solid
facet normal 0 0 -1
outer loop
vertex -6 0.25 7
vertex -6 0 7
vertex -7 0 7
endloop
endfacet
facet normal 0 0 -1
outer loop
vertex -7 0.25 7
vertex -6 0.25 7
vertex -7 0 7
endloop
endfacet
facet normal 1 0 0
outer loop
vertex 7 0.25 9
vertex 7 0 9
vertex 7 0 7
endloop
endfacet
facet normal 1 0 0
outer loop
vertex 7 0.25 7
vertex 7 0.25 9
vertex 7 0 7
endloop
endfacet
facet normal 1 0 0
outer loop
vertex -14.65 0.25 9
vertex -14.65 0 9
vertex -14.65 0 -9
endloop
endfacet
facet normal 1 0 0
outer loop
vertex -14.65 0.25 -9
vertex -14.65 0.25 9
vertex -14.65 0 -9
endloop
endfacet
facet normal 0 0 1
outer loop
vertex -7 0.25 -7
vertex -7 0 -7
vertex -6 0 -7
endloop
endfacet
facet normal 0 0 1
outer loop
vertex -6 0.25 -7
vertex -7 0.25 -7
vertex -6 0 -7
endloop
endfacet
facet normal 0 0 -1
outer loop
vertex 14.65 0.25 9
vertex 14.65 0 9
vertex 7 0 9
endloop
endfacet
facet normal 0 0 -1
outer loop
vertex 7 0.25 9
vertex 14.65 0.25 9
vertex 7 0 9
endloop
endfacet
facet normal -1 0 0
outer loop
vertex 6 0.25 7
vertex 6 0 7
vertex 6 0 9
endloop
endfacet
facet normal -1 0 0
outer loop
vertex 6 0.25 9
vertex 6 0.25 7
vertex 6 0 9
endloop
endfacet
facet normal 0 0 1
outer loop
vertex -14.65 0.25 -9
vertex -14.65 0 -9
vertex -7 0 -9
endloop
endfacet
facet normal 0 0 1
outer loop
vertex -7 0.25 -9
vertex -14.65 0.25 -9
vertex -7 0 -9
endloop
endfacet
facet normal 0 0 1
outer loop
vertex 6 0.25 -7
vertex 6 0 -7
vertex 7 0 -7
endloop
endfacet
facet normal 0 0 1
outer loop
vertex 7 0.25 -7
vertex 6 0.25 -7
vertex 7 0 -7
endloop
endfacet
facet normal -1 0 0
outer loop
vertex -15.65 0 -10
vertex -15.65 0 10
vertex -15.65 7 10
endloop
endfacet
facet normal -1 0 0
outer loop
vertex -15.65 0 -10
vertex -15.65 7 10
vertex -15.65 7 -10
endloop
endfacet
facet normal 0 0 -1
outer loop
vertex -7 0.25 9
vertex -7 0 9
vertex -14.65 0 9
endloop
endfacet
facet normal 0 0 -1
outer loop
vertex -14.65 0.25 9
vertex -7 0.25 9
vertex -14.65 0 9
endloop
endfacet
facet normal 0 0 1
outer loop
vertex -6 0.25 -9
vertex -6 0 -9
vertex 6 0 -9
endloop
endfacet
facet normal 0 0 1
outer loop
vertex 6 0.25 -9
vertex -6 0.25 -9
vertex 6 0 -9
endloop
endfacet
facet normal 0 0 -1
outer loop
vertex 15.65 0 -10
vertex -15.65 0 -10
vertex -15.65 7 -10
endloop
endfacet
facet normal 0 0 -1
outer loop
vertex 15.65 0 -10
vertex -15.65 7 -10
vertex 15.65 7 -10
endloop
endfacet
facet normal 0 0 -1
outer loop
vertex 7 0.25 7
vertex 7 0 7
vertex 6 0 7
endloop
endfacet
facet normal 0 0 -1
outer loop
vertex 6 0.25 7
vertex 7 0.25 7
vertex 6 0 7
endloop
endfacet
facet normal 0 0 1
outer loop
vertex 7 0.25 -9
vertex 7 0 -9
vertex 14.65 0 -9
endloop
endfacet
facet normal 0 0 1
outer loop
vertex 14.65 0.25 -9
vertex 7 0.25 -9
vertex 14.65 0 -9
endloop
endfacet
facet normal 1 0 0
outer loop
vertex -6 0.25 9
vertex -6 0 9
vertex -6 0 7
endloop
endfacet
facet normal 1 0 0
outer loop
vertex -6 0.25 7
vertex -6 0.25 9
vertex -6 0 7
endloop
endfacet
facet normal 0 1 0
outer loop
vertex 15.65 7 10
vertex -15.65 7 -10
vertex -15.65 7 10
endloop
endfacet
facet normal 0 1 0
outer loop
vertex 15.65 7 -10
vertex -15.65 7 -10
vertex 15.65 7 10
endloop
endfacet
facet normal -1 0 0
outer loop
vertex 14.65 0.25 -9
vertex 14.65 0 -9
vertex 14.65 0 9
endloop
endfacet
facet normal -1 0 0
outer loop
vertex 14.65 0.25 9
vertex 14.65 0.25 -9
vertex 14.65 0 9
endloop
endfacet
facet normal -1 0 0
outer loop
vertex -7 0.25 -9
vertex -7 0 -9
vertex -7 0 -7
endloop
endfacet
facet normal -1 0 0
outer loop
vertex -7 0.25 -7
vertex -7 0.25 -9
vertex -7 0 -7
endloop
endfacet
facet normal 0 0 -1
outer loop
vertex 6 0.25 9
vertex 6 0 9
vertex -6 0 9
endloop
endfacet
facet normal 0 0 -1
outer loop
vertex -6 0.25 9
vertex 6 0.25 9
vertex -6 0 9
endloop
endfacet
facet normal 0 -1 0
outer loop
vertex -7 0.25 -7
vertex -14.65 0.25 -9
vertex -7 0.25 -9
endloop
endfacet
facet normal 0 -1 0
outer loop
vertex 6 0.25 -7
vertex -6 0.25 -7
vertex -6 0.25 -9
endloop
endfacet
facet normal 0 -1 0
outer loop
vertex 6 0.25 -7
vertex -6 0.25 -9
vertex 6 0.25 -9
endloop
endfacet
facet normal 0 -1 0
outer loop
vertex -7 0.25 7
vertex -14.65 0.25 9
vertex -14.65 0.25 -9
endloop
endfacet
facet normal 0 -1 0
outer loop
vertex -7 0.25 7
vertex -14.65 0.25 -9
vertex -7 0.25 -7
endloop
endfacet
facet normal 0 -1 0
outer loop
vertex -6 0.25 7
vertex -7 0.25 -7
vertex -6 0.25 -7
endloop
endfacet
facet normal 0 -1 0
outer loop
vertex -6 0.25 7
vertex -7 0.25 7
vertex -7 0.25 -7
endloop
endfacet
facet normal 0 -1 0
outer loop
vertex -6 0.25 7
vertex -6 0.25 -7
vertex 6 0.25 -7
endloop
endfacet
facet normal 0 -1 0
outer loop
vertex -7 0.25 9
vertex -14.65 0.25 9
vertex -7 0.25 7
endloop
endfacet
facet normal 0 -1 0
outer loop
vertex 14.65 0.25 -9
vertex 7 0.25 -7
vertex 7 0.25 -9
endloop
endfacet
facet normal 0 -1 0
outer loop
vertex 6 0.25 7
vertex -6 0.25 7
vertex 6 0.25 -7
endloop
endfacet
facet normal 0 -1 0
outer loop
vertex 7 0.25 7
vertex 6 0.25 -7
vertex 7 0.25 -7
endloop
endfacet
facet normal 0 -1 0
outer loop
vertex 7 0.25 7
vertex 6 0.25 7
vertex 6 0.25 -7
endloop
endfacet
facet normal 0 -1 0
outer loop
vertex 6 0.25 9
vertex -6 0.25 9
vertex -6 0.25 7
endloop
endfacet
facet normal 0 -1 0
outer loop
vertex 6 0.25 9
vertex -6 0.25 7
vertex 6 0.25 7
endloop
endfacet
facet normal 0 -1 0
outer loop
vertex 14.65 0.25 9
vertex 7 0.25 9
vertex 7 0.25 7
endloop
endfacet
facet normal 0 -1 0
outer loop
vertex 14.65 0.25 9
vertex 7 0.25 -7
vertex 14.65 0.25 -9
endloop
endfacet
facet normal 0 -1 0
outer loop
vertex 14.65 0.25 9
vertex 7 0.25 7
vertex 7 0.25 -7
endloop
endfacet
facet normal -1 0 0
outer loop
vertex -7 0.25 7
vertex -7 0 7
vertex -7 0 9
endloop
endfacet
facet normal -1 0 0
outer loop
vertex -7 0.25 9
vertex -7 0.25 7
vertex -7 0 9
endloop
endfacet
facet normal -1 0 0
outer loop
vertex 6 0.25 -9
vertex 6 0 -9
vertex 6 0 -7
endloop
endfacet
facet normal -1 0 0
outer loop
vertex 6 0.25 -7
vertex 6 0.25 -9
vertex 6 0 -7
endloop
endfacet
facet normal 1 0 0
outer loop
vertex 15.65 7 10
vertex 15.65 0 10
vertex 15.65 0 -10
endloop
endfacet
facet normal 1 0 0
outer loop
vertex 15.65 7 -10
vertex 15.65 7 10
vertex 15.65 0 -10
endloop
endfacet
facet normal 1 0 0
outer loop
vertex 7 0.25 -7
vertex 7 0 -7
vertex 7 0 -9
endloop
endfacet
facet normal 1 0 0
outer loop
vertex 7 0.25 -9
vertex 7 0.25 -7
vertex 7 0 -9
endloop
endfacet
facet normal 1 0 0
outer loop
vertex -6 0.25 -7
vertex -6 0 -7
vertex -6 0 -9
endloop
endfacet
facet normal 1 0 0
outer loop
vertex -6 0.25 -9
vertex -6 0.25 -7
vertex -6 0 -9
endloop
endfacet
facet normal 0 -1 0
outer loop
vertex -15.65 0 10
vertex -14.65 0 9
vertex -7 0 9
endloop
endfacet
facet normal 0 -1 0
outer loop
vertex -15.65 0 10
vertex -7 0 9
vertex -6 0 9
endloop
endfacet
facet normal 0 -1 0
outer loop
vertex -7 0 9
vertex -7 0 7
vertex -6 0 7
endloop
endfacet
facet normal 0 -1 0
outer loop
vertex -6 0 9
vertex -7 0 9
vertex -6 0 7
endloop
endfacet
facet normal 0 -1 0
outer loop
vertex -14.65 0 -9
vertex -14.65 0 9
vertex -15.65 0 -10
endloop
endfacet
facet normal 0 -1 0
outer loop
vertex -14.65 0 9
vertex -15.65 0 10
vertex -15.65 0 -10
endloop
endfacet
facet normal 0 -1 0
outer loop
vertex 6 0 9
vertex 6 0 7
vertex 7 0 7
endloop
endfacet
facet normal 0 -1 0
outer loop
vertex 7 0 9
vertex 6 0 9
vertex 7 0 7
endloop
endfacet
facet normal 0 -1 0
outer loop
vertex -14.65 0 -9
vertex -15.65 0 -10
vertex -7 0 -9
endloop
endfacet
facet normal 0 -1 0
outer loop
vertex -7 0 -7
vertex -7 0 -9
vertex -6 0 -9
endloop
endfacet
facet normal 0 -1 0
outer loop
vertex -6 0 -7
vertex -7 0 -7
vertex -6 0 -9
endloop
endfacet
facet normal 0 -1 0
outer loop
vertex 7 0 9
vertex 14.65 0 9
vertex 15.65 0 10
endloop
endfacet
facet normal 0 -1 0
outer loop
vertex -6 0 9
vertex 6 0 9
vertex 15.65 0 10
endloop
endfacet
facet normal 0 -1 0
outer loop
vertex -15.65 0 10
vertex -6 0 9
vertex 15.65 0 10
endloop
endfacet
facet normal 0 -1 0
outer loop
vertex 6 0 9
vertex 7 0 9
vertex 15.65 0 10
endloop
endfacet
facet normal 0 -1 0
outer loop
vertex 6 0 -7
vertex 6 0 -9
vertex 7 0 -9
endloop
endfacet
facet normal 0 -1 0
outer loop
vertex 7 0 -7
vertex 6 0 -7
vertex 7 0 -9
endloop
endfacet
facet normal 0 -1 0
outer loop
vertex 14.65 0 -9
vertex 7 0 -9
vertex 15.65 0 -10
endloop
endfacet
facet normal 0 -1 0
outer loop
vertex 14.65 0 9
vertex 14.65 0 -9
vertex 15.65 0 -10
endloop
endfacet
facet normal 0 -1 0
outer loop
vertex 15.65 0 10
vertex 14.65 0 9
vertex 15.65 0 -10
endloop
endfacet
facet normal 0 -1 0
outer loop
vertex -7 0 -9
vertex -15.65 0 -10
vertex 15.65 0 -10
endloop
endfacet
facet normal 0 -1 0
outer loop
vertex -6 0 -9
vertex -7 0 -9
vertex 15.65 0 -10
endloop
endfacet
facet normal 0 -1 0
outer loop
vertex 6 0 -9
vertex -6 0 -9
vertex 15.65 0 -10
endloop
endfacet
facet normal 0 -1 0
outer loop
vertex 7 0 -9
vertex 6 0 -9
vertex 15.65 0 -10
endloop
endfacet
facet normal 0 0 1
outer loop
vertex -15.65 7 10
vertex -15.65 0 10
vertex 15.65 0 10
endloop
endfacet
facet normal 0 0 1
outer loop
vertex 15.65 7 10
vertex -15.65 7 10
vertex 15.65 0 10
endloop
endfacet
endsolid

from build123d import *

# Parameters (mm, degrees)
SKETCH1_W           = 31.3
SKETCH1_H           = 20
BOSS_EXTRUDE1_DEPTH = 7
SKETCH2_W           = 31.3
SKETCH2_H           = 20
BOSS_EXTRUDE2_DEPTH = 1
BOSS_EXTRUDE4_START = -0.25
SKETCH3_W           = 29.3
SKETCH3_H           = 18
BOSS_EXTRUDE4_DEPTH = 5.75


with BuildPart() as part:
    # Sketch1 → Boss-Extrude1 (new body)
    with BuildSketch(Plane(origin=(0, 0, 0), x_dir=(1, 0, 0), z_dir=(0, 1, 0))):
        Rectangle(SKETCH1_W, SKETCH1_H)
        Polygon((-14.65, -9), (-14.65, 9), (-7, 9), (-7, 7), (-6, 7), (-6, 9), (6, 9), (6, 7), (7, 7), (7, 9), (14.65, 9), (14.65, -9), (7, -9), (7, -7), (6, -7), (6, -9), (-6, -9), (-6, -7), (-7, -7), (-7, -9), align=None, mode=Mode.SUBTRACT)
    extrude(amount=BOSS_EXTRUDE1_DEPTH)

    # Sketch2 → Boss-Extrude2 (add)
    with BuildSketch(Plane(origin=(0, 7, 0), x_dir=(1, 0, 0), z_dir=(0, 1, 0))):
        Rectangle(SKETCH2_W, SKETCH2_H)
    extrude(amount=-BOSS_EXTRUDE2_DEPTH)

    # Sketch3 → Boss-Extrude4 (add)
    with BuildSketch(Plane.XZ.offset(BOSS_EXTRUDE4_START)):
        Rectangle(SKETCH3_W, SKETCH3_H)
    extrude(amount=-BOSS_EXTRUDE4_DEPTH)


solid = part.part
